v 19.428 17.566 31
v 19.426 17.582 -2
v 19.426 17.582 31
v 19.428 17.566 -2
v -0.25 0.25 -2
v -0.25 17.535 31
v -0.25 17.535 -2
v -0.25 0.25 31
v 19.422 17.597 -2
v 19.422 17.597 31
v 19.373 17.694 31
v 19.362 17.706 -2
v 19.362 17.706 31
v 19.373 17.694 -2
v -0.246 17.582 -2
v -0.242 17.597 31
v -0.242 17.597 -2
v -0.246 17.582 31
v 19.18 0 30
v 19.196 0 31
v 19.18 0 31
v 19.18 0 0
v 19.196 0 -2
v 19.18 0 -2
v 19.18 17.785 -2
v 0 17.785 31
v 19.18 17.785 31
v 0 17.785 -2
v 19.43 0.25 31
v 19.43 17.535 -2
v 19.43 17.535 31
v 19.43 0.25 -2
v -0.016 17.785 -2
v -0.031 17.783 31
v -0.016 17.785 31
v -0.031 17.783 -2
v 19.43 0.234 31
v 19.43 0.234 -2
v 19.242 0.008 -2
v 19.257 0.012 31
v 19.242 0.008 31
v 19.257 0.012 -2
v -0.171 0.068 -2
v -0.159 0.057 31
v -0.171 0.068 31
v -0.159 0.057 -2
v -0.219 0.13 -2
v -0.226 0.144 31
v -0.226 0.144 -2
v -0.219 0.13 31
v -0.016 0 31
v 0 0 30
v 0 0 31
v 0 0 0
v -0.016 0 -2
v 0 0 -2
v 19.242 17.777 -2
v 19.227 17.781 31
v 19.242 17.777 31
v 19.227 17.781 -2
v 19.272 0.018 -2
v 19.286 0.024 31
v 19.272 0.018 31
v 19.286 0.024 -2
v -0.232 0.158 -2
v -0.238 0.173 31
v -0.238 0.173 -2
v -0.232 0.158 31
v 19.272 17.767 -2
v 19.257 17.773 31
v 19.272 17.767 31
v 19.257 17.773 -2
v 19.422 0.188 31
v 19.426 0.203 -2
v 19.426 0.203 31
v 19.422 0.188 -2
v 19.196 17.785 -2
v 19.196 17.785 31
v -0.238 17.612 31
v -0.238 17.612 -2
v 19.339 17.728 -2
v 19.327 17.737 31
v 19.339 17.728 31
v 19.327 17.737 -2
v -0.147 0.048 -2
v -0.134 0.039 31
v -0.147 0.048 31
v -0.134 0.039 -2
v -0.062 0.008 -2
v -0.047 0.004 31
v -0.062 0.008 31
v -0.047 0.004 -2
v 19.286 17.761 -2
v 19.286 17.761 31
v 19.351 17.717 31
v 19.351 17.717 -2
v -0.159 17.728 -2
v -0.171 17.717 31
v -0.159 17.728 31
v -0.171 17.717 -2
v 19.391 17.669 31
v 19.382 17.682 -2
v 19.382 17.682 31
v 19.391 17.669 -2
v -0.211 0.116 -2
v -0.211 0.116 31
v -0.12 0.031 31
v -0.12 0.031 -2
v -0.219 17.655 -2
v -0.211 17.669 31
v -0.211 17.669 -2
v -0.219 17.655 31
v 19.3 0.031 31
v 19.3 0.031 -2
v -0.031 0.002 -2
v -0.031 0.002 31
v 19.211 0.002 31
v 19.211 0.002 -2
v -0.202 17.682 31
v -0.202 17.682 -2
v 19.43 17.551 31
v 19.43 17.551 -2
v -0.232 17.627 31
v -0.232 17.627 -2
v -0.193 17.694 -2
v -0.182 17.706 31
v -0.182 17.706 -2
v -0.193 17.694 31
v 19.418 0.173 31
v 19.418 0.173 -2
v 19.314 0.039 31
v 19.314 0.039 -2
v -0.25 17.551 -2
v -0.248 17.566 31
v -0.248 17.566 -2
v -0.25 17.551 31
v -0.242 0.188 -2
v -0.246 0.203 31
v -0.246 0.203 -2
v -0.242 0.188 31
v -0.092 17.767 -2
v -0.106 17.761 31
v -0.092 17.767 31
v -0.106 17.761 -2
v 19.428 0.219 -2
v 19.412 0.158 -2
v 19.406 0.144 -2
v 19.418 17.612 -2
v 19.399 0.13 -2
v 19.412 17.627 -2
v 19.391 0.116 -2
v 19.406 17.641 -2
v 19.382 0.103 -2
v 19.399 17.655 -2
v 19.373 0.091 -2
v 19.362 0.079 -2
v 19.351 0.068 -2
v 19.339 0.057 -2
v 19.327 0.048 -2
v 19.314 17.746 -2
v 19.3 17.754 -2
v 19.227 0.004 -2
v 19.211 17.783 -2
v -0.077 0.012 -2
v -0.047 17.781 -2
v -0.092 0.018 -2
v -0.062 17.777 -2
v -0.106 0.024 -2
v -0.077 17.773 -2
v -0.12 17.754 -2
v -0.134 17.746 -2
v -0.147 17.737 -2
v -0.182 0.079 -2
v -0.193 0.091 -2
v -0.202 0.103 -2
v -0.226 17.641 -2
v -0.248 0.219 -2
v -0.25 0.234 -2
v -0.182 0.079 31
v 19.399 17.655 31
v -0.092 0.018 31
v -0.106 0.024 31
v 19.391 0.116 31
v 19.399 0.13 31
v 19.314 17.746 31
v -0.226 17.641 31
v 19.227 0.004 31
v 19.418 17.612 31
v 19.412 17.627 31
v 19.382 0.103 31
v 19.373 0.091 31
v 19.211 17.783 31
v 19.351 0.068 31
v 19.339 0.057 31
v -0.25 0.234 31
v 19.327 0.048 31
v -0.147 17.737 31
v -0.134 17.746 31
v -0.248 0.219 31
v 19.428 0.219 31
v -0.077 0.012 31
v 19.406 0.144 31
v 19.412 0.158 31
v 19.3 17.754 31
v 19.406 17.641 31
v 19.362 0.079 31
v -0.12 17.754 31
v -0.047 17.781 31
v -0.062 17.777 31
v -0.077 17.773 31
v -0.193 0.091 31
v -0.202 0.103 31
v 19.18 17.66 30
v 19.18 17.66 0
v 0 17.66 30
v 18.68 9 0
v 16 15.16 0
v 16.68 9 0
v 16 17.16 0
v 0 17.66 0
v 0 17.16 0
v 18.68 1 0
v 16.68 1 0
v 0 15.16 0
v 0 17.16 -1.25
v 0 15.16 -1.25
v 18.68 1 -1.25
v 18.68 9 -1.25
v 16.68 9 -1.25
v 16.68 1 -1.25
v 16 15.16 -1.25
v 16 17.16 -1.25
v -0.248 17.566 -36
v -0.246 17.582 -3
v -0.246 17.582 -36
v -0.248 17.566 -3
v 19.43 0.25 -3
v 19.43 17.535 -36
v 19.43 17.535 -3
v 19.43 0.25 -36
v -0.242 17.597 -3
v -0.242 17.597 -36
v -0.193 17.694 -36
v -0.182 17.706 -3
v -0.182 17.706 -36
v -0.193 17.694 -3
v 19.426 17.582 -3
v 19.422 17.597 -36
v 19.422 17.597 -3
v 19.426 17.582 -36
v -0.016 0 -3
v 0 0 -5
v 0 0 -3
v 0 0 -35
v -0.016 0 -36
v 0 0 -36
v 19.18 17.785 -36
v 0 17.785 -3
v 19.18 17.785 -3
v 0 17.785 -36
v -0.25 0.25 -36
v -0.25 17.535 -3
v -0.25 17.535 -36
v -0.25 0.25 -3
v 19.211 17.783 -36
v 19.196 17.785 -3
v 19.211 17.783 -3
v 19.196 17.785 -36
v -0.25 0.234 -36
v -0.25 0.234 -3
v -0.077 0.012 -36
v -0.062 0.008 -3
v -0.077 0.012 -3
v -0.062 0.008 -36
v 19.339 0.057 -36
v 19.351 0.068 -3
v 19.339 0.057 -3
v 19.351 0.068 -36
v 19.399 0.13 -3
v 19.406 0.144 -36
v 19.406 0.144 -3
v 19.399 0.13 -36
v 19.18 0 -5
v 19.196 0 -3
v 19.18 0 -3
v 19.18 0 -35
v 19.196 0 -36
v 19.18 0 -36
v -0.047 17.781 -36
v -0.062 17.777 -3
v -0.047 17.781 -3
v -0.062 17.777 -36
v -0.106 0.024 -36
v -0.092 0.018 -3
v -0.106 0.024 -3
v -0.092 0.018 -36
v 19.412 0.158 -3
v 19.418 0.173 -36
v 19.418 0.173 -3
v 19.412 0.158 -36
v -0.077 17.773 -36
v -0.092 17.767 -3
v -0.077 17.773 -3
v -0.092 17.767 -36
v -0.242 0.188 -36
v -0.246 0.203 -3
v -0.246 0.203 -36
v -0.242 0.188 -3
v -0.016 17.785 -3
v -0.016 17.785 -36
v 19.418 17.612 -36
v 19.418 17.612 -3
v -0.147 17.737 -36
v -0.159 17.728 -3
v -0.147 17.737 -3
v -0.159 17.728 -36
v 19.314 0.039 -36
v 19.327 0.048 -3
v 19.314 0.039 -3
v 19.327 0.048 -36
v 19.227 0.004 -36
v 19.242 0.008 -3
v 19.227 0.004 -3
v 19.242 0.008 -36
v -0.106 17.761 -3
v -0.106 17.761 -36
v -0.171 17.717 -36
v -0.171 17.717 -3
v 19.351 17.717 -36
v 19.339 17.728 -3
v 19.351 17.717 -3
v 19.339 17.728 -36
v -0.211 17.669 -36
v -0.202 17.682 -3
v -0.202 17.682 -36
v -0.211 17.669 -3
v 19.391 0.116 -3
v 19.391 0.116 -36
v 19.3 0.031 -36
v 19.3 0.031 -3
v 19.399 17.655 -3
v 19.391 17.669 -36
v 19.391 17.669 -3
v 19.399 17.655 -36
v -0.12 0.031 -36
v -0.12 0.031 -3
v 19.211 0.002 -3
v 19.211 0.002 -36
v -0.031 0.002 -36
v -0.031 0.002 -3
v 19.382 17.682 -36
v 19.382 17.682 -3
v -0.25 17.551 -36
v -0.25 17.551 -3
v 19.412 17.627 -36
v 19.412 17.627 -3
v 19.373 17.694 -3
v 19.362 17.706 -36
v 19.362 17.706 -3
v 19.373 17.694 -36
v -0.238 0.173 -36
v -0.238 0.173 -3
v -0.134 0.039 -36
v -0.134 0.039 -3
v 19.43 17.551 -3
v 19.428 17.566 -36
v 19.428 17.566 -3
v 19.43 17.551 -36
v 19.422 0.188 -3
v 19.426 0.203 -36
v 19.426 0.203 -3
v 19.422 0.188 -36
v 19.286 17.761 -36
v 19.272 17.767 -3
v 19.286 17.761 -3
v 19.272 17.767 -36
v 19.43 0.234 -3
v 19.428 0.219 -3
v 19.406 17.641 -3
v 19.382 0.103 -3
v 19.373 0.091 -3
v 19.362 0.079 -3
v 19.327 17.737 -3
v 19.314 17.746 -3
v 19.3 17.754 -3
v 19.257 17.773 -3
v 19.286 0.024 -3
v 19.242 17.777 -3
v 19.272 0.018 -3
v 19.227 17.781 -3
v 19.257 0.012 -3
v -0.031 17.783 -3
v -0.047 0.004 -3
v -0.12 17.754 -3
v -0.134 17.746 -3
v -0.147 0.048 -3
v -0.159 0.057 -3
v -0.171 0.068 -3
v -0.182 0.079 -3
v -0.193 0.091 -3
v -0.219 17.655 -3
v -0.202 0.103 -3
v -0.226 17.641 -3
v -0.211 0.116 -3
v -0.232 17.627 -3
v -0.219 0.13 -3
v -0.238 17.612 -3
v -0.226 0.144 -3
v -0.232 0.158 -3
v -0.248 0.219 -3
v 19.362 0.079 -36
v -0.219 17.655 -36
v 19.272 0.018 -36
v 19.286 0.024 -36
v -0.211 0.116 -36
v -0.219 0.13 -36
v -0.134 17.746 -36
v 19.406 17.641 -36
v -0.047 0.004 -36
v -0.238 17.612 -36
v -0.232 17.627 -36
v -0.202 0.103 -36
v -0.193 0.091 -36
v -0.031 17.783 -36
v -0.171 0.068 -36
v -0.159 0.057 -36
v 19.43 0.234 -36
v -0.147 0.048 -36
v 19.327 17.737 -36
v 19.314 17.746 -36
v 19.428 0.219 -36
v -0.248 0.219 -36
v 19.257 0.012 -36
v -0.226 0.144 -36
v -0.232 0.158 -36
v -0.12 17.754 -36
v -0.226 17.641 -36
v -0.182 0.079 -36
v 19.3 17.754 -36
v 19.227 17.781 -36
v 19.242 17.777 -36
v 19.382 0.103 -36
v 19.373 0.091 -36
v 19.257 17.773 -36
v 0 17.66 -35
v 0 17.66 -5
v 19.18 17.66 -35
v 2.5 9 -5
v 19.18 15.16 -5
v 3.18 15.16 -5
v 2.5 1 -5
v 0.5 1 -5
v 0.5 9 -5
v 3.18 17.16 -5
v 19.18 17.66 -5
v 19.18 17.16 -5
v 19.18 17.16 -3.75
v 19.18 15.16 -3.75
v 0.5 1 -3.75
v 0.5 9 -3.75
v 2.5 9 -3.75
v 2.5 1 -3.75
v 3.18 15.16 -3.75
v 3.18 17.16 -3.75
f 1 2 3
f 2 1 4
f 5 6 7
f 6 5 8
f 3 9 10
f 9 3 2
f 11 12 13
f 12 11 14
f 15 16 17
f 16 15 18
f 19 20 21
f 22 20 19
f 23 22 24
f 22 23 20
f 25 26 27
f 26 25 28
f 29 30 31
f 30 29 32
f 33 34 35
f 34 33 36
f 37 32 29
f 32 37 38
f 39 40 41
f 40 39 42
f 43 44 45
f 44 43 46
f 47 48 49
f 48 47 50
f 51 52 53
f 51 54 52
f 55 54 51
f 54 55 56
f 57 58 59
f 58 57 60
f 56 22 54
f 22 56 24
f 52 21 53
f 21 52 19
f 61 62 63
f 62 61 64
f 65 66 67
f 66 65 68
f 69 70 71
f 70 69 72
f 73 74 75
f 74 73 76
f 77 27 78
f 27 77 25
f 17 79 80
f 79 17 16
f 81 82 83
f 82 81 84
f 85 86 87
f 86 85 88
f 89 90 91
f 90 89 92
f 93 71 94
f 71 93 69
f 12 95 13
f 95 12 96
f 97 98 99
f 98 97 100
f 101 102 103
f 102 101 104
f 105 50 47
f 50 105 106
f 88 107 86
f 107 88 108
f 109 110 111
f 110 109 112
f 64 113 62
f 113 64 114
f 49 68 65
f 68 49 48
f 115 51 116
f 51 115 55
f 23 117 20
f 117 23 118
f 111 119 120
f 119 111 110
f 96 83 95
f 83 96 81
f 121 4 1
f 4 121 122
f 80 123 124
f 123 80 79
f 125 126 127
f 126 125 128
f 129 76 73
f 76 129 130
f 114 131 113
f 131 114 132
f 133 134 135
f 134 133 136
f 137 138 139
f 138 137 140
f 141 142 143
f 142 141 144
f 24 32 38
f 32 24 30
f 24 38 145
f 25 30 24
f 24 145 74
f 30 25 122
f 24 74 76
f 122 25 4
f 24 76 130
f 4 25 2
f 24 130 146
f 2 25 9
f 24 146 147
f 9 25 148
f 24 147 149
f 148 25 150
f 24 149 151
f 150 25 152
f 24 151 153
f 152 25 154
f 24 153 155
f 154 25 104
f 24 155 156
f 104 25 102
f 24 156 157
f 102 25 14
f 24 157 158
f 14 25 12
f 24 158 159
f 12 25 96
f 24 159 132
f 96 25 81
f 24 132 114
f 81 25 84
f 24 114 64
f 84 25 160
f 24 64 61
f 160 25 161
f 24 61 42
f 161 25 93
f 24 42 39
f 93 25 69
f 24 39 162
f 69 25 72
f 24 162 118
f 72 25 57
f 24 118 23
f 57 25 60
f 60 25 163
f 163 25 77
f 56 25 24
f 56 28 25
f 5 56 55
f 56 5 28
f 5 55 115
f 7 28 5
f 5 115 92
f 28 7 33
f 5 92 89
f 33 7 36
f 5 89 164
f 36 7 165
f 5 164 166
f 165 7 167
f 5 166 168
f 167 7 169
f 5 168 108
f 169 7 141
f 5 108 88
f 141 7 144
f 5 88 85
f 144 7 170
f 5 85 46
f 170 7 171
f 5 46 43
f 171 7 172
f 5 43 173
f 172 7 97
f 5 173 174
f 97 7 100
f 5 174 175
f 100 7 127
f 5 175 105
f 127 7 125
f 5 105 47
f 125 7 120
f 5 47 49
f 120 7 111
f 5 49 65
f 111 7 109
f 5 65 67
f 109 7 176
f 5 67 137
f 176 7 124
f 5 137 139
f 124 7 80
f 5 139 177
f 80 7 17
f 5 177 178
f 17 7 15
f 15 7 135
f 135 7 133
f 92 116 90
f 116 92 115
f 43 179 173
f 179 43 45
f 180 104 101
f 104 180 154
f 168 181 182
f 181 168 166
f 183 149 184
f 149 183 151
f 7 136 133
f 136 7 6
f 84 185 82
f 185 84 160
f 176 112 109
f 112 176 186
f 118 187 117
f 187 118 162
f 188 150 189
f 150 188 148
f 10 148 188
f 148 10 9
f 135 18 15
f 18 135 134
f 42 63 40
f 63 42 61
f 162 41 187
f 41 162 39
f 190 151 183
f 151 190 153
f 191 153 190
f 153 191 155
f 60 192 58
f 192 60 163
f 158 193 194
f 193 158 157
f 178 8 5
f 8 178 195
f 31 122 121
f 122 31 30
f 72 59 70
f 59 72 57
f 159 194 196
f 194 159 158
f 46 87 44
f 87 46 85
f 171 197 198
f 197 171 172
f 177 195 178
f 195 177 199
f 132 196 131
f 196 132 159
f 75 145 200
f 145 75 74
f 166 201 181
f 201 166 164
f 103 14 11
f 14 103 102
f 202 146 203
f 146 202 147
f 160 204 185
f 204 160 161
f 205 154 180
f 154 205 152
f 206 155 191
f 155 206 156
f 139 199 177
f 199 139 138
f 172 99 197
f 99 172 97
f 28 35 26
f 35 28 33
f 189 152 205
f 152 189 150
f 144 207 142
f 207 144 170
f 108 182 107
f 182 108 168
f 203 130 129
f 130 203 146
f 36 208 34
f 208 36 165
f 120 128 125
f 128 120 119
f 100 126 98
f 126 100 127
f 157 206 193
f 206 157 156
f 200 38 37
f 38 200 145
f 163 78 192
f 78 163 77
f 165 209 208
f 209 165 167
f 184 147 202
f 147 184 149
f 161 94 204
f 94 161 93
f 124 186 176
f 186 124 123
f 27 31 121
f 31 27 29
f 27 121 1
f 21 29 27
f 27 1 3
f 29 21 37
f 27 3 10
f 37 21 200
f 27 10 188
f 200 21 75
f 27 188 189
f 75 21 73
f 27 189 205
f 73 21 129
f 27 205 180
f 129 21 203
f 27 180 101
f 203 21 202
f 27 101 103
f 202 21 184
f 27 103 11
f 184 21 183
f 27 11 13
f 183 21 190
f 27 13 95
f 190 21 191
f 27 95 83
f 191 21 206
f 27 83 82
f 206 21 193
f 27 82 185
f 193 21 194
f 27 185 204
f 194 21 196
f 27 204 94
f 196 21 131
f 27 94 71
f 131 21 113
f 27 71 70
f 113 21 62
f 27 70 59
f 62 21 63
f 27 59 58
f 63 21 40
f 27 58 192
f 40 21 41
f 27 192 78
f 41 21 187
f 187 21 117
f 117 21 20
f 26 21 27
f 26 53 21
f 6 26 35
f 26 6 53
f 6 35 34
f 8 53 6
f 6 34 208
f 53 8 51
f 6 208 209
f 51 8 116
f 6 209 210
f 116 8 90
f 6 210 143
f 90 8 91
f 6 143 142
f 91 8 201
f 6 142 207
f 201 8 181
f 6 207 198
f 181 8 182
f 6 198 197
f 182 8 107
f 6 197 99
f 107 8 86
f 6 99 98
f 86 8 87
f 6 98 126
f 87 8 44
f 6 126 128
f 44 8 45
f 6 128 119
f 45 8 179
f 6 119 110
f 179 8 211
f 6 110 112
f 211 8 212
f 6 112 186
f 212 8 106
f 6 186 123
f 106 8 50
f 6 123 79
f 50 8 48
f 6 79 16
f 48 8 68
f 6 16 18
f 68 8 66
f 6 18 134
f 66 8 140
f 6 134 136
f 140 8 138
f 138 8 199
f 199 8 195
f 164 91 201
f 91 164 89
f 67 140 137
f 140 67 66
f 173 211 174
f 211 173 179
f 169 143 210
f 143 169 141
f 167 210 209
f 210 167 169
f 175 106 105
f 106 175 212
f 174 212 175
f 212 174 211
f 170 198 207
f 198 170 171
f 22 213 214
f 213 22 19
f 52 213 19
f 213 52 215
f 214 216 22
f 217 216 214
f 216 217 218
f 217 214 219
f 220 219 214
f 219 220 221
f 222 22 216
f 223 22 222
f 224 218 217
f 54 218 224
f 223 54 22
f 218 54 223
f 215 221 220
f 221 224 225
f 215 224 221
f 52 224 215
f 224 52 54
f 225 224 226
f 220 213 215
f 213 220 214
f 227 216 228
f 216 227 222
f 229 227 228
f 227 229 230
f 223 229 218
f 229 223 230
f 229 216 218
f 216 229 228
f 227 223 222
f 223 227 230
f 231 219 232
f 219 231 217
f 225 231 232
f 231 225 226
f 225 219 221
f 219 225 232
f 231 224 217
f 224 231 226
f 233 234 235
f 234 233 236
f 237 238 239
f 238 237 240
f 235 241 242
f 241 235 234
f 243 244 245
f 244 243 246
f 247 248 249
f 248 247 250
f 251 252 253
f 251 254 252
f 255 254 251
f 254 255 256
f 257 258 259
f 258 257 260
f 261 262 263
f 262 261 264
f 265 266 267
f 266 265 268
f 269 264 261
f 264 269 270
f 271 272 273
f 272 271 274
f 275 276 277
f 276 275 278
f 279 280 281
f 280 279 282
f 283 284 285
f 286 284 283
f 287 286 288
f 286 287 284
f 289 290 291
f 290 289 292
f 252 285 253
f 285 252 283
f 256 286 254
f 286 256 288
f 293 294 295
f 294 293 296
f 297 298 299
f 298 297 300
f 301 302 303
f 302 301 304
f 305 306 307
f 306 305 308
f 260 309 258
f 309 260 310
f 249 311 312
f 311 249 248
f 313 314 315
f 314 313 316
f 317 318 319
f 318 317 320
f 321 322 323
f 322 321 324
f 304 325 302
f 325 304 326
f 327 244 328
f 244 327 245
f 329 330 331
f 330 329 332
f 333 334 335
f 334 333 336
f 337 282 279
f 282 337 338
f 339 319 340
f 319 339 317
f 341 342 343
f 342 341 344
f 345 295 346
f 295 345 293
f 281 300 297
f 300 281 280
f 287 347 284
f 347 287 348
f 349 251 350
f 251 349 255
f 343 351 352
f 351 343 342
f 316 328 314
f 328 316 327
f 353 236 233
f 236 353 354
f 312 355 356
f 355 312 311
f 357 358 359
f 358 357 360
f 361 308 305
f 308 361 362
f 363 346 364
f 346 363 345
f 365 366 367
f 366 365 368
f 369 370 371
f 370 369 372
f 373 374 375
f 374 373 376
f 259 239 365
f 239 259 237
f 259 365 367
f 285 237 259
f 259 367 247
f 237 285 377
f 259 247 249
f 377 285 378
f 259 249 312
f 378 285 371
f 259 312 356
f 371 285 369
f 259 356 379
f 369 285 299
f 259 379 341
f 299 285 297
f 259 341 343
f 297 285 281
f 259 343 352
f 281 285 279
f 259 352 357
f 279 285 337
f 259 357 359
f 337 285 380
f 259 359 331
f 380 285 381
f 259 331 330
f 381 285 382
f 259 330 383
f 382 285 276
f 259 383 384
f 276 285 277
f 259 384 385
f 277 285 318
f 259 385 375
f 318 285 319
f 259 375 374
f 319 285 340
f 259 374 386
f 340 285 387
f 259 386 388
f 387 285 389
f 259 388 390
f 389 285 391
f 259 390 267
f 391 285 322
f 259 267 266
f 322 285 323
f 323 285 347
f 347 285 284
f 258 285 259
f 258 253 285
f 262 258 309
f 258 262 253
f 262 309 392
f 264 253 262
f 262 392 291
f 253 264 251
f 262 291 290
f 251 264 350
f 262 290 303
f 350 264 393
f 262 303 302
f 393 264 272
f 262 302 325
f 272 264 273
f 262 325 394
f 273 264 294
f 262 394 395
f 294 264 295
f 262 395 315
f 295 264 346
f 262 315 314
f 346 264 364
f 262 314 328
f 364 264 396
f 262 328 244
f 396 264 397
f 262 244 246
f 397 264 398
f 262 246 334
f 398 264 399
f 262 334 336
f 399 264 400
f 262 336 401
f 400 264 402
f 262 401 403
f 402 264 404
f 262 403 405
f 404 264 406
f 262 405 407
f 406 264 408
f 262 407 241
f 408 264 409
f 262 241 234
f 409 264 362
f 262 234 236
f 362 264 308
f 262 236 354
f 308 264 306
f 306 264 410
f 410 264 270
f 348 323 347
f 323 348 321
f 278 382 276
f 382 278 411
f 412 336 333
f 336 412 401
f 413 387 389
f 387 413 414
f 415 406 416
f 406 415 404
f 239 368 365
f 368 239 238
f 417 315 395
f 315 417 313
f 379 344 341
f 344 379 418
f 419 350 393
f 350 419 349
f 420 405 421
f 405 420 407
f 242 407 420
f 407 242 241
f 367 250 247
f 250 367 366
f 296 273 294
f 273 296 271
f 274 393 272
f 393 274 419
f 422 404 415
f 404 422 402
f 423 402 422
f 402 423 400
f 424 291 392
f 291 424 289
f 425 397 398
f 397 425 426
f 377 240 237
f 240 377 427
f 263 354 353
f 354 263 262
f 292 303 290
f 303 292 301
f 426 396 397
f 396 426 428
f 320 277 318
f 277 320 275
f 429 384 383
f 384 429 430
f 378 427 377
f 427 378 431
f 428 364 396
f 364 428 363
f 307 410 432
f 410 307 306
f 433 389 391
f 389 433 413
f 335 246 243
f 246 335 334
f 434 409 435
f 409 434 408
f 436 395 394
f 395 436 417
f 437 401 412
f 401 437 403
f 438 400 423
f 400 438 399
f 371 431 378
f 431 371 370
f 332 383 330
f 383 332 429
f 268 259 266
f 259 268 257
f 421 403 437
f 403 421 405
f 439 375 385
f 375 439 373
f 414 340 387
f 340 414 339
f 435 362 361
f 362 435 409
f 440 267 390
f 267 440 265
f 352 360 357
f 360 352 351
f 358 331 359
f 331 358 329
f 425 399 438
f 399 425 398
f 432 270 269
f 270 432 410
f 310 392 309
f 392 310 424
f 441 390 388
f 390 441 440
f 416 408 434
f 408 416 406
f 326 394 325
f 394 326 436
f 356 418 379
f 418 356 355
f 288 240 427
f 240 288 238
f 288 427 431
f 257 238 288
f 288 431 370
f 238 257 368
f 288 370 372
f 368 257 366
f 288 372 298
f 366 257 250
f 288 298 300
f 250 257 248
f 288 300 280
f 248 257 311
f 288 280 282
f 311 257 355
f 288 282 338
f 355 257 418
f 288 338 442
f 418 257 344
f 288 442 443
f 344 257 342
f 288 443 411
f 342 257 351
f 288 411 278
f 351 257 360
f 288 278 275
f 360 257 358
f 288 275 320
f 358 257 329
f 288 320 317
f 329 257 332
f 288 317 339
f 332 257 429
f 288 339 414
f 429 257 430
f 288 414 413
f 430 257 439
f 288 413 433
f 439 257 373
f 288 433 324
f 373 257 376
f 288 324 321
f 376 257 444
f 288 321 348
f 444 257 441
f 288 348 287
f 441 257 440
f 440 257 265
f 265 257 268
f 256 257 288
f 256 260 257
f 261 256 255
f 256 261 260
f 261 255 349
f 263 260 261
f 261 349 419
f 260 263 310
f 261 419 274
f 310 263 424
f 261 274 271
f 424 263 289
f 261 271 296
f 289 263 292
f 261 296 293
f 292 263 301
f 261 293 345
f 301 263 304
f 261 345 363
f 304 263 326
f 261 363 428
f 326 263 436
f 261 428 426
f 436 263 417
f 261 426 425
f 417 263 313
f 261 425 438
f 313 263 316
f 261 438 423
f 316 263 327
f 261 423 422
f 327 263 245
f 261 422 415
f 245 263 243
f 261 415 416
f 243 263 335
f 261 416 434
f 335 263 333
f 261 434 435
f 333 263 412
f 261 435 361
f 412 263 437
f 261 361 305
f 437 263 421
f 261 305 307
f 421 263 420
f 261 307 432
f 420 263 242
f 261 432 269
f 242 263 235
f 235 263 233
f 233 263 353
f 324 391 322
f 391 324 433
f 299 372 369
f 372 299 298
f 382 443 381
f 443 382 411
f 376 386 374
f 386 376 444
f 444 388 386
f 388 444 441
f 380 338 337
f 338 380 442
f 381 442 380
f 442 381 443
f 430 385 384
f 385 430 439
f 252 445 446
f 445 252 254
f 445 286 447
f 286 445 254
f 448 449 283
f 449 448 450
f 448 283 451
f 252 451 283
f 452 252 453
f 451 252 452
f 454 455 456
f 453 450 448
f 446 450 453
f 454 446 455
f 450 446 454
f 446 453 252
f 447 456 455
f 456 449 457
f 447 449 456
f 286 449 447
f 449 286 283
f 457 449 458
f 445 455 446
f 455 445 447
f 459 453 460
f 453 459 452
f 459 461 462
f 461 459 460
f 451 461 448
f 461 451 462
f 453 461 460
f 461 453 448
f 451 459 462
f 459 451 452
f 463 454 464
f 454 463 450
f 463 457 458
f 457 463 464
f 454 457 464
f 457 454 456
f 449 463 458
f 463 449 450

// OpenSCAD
// file: rgb_shield.scad
$fn        = 100;

rgb_pcb_x      = 19;
rgb_pcb_y      = 16.55;
rgb_pcb_z      = 2.4;
rgb_hole_diam  = 1;
rgb_hole_pitch = 2.6;
rgb_hole_offset = 1.4;

module rgb_pcb() {
  color("DarkOliveGreen")
  difference() {
    cube(size=[rgb_pcb_x, rgb_pcb_y, rgb_pcb_z]);

    for ( i = [0 : 5] ) {
      translate([rgb_hole_offset + (i * rgb_hole_pitch), rgb_pcb_y - rgb_hole_offset, 0])
      cylinder(r=rgb_hole_diam/2, h=10, center=true);
    }

    for ( i = [0 : 2] ) {
      translate([rgb_pcb_x - rgb_hole_offset, rgb_hole_offset + (i * rgb_hole_pitch), 0])
      cylinder(r=rgb_hole_diam/2, h=10, center=true);
    }
  }
}

module resistor() {
  res_end_r = 1.14;
  res_l = 6.7;
  pitch = 7.7;
  lead_r = 0.2;

  translate([0,0,res_end_r]) {
    color("Tan")
    translate([(pitch - res_l + res_end_r)/2,0,0]) {
      translate([res_end_r,0,0]) sphere(res_end_r);
      translate([res_end_r/2,0,0]) rotate([0,90,0]) cylinder(r=0.95, h=res_l - (res_end_r*2));
      translate([res_l - (res_end_r*2),0,0]) sphere(res_end_r);
    }

    color("Silver") translate([lead_r/2, 0, 0]) sphere(lead_r);
    color("Silver") translate([lead_r/2, 0, 0]) rotate([0,90,0]) cylinder(r=lead_r, h=pitch - lead_r);
    color("Silver") translate([pitch - lead_r/2, 0, 0]) sphere(lead_r);
  }

  color("Silver") translate([lead_r/2,0,0]) cylinder(r=lead_r, h=res_end_r);
  color("Silver") translate([pitch - lead_r/2,0,0]) cylinder(r=lead_r, h=res_end_r);
}

module led() {
  led_r = 2.5;
  led_h = 8.8;
  ridge_r = 2.935;
  lead_pitch = 1.625;
  lead_length = 5;
  lead_lw = 0.7;
  below_pcb = 0.3;

  color("White")
  translate([0,0,lead_length - below_pcb])
  difference() {
    union() {
      translate([0,0,led_h-led_r]) sphere(r=led_r);
      cylinder(r=led_r, h=led_h-led_r);
      cylinder(r=ridge_r, h=1);
    }
    translate([led_r,-5,-1]) cube(size=[10, 10, 10]);
  }
  color("Silver") {
    for ( i = [-1.5 : 1.5] ) {
      translate([(i * -lead_pitch)-lead_lw/4,0,-below_pcb+lead_length/2]) cube(size=[lead_lw, lead_lw, lead_length], center=true);
    }
  }
}

module rgb_header() {
  cube(size=[2.6, 2.6, 2.6], center=true);
}

module rgb_headers() {
  for ( i = [0 : 5] ) {
    color("DimGray")
    translate([rgb_hole_offset + (i * rgb_hole_pitch), rgb_pcb_y - rgb_hole_offset, -1.3]) rgb_header();
    translate([rgb_hole_offset + (i * rgb_hole_pitch), rgb_pcb_y - rgb_hole_offset, 1.45-11.3+rgb_pcb_z]) cylinder(r=rgb_hole_diam/2, h=11.3);
  }

  for ( i = [0 : 2] ) {
    color("DimGray")
    translate([rgb_pcb_x - rgb_hole_offset, rgb_hole_offset + (i * rgb_hole_pitch), -1.3]) rgb_header();
    translate([rgb_pcb_x - rgb_hole_offset, rgb_hole_offset + (i * rgb_hole_pitch), 1.45-11.3+rgb_pcb_z]) cylinder(r=rgb_hole_diam/2, h=11.3);
  }
}

module shield_assembly() {
  rgb_pcb();
  translate([1.15,2.4,rgb_pcb_z]) rotate([0,0,90]) resistor();
  translate([3.65,2.4,rgb_pcb_z]) rotate([0,0,90]) resistor();
  translate([14.9,2.4,rgb_pcb_z]) rotate([0,0,90]) resistor();
  translate([9.71,7,0]) led();
  rgb_headers();
}

// shield_assembly();
// file: digispark.scad
$fn        = 50;

pcb_x      = 19.18;
pcb_y      = 17.66;
pcb_z      = 2.4;
usb_x      = 12.26;
usb_y      = 8.79;
hole_diam  = 1;
hole_pitch = 2.6;
hole_offset = 1.4;

module pcb() {
  color("DarkOliveGreen")
  difference() {
    union() {
      // main PCB
      cube(size=[pcb_x, pcb_y, pcb_z], center=false);

      // USB connector
      translate([(pcb_x - usb_x)/2,-usb_y,0])
      cube(size=[usb_x, usb_y, pcb_z], center=false);
    }

    for ( i = [0 : 5] ) {
      translate([hole_offset + (i * hole_pitch), pcb_y - hole_offset, 0])
      cylinder(r=hole_diam/2, h=10, center=true);
    }

    for ( i = [0 : 2] ) {
      translate([pcb_x - hole_offset, hole_offset + 1.2 + (i * hole_pitch), 0])
      cylinder(r=hole_diam/2, h=10, center=true);
    }
  }

  pad_spacing_a = 1.00;
  pad_spacing_b = 0.65;
  pad_a = [1.96, 8.0, 0.02];
  pad_b = [1.48, 6.9, 0.02];
  usb_pad_width = (pad_spacing_a * 2) + (pad_spacing_b * 2) + (pad_a[0] * 2) + (pad_b[0] * 2);


  color("Gold") {
    for ( i = [0 : 5] ) {
      difference() {
        translate([hole_offset + (i * hole_pitch), pcb_y - hole_offset, pcb_z])
        cylinder(r=hole_diam, h=0.02, center=true);
        translate([hole_offset + (i * hole_pitch), pcb_y - hole_offset, 0])
        cylinder(r=hole_diam/2, h=10, center=true);
      }

    }

    for ( i = [0 : 2] ) {
      difference() {
        translate([pcb_x - hole_offset, hole_offset + 1.2 + (i * hole_pitch), pcb_z])
        cylinder(r=hole_diam, h=0.02, center=true);
        translate([pcb_x - hole_offset, hole_offset + 1.2 + (i * hole_pitch), 0])
        cylinder(r=hole_diam/2, h=10, center=true);
      }
    }

    translate([usb_pad_width/2 - (pad_a[0] - pad_b[0])/2,0,0]) {
      translate([    0, -8.0, pcb_z]) cube(size=pad_a);
      translate([ pad_a[0] + pad_spacing_a, -6.9, pcb_z]) cube(size=pad_b);
      translate([ pad_a[0] + pad_b[0] + pad_spacing_a + pad_spacing_b, -6.9, pcb_z]) cube(size=pad_b);
      translate([ pad_a[0] + pad_b[0] + pad_b[0] + pad_spacing_a + pad_spacing_b + pad_spacing_a, -8.0, pcb_z]) cube(size=pad_a);
    }
  }

}

module vreg_leg() {
  color("Silver")
  union() {
    translate([0, 0, 0.8]) cube(size=[0.8, 0.8, 0.8], center=false);
    translate([0, 1.36, -0.1]) rotate([45,0,0])  cube(size=[0.8, 0.8, 1.6], center=false);
    translate([0, 0.8, 0]) cube(size=[0.8, 2.2, 0.8], center=false);
  }
}

module atmel_leg() {
  color("Silver")
  union() {
    translate([0, 0, 0.48]) cube(size=[0.48, 0.48, 0.48], center=false);
    translate([0, 0.82, -0.06]) rotate([45,0,0])  cube(size=[0.48, 0.48, 0.96], center=false);
    translate([0, 0.48, 0]) cube(size=[0.48, 1.16, 0.48], center=false);
  }
}

module smd_comp() {
  color("Silver") translate([0,0,0]) cube(size=[0.48, 0.35, 0.2], center=false);
  color("DimGray") translate([0,0.35,0]) cube(size=[0.48, 0.55, 0.2], center=false);
  color("Silver") translate([0,0.35+0.55,0]) cube(size=[0.48, 0.35, 0.2], center=false);
}

module chips() {
  // vreg
  vreg_w = 7;
  vreg_l = 5;
  vreg_x = 7.5;
  vreg_y = 3.9;
  vreg_x2 = vreg_x + vreg_w;
  vreg_y2 = vreg_y + vreg_l;

  color("DimGray") translate([vreg_x, 3.9, pcb_z]) cube(size=[7, 5, 2.35], center=false);
  color("Silver") translate([(vreg_x + (7 - 5.45)/2), 3.9-1.4, pcb_z]) cube(size=[5.45, 1.4, 0.39], center=false);

  translate([vreg_x, vreg_y2, pcb_z]) vreg_leg();
  translate([vreg_x - 0.4 + vreg_w/2, vreg_y2, pcb_z]) vreg_leg();
  translate([vreg_x2 - 0.8, vreg_y2, pcb_z]) vreg_leg();

  // atmel
  color("DimGray")
  translate([0.25, 6.16, pcb_z]) cube(size=[5.11, 5.11, 1.44], center=false);

  atmel_pitch = 5.11/3 - 0.48/2;

  for ( i = [0 : 3] ) {
     translate([0.25+0.48+(0.48/4) + (atmel_pitch*i),6.16,pcb_z]) rotate([0,0,180]) atmel_leg();
  }

  for ( i = [0 : 3] ) {
     translate([0.25+(0.48/4) + (atmel_pitch*i),6.16 + 5.11,pcb_z]) atmel_leg();
  }

  translate([0.2,1.75,pcb_z]) smd_comp();
  translate([0.88,1.75,pcb_z]) smd_comp();
  translate([6.4,2.8,pcb_z]) smd_comp();

  color("DimGray")
  translate([3.26,0.5,pcb_z]) cube(size=[1.66, 1.27, 0.94], center=false);

  color("DimGray")
  translate([5.75,5.5,pcb_z]) cube(size=[1.27, 1.66, 0.94], center=false);

  color("DimGray")
  translate([pcb_x - 0.05 - 1.58, pcb_y - 1.88 - 2.58 ,pcb_z]) cube(size=[1.58, 2.5, 1], center=false);

  color("DimGray")
  translate([10.5,13,pcb_z]) cube(size=[1.27, 1.66, 0.94], center=false);

  translate([6.4,11,pcb_z]) smd_comp();

  translate([pcb_x - 0.5,10,pcb_z]) rotate([0,0,90]) smd_comp();

}

module header() {
  difference() {
    cube(size=[2.6, 2.6, 7.8], center=true);
    cube(size=[1.5, 1.5, 10], center=true);
  }
}

module headers() {
  for ( i = [0 : 5] ) {
    color("DimGray")
    translate([hole_offset + (i * hole_pitch), pcb_y - hole_offset, 3.9 + pcb_z + 0.65]) header();
    translate([hole_offset + (i * hole_pitch), pcb_y - hole_offset, -1.24]) cylinder(r=hole_diam/2, h=4.46);
  }

  for ( i = [0 : 2] ) {
    color("DimGray")
    translate([pcb_x - hole_offset, hole_offset + 1.2 + (i * hole_pitch), 3.9 + pcb_z + 0.65]) header();
    translate([pcb_x - hole_offset, hole_offset + 1.2 + (i * hole_pitch), -1.24]) cylinder(r=hole_diam/2, h=4.46);
  }
}

// pcb();
// chips();
// headers();
// main file
include <digispark.scad>;
include <rgb_shield.scad>;

$fn=100;

// pcb();
// chips();
// headers();
// translate([0,1.2,14]) shield_assembly();

pcb_x      = 19.18;
pcb_y      = 17.66;

bottom_h = 33;

// pcb();
// chips();
// headers();
// translate([0,1.2,14]) {
//   rgb_pcb();
//   translate([1.15,2.4,rgb_pcb_z]) rotate([0,0,90]) resistor();
//   translate([3.65,2.4,rgb_pcb_z]) rotate([0,0,90]) resistor();
//   translate([14.9,2.4,rgb_pcb_z]) rotate([0,0,90]) resistor();
//   translate([9.71,7,0]) led();
// }
// translate([0,1.2,14]) shield_assembly();

// main shell
corner_r = 0.25;
module main_shell() {
  difference() {
    hull() {
      translate([0,corner_r,-2]) cylinder(r=corner_r, h=bottom_h);
      translate([pcb_x, pcb_y-(corner_r/2),-2]) cylinder(r=corner_r, h=bottom_h);
      translate([pcb_x, corner_r,-2]) cylinder(r=corner_r, h=bottom_h);
      translate([0, pcb_y-(corner_r/2),-2]) cylinder(r=corner_r, h=bottom_h);
    }
    translate([0,-1,0]) cube(size=[pcb_x, pcb_y+1, 30]);

    hull() {
      translate([9.71,8.2,17]) cylinder(r=2.8, h=10);
      translate([9.71,-3,17]) cylinder(r=2.8, h=10);
    }

    translate([9.71, 8.2,10]) cylinder(r=4, h=10);

    translate([pcb_x - 2.5,1,-1.25]) cube(size=[2, 8, 4]);
    translate([0,pcb_y - 2.5,-1.25]) cube(size=[16, 2, 4]);
  }
}


// tiny part
module tiny_part() {
  difference() {
    union() {
      translate([0,0,pcb_z]) cube(size=[pcb_x, 1.2, 18.6]);
      difference() {
        translate([pcb_x/2 - 2.68,0,pcb_z+2.35]) cube(size=[5.6, 10, 16.25]);
        translate([0,1.2,14]) cube(size=[pcb_x, 20, pcb_z]);
        translate([9.71, 8.2,17]) cylinder(r=2.8, h=10);
        translate([9.71, 8.2,15]) cylinder(r=4, h=5);
        translate([5,8.2,19]) cube(size=[10, 10, 10]);
      }
    }
    main_shell();
  }
}


// tiny_part();
main_shell();
translate([pcb_x,0,-5]) rotate([0,180,0]) main_shell();
